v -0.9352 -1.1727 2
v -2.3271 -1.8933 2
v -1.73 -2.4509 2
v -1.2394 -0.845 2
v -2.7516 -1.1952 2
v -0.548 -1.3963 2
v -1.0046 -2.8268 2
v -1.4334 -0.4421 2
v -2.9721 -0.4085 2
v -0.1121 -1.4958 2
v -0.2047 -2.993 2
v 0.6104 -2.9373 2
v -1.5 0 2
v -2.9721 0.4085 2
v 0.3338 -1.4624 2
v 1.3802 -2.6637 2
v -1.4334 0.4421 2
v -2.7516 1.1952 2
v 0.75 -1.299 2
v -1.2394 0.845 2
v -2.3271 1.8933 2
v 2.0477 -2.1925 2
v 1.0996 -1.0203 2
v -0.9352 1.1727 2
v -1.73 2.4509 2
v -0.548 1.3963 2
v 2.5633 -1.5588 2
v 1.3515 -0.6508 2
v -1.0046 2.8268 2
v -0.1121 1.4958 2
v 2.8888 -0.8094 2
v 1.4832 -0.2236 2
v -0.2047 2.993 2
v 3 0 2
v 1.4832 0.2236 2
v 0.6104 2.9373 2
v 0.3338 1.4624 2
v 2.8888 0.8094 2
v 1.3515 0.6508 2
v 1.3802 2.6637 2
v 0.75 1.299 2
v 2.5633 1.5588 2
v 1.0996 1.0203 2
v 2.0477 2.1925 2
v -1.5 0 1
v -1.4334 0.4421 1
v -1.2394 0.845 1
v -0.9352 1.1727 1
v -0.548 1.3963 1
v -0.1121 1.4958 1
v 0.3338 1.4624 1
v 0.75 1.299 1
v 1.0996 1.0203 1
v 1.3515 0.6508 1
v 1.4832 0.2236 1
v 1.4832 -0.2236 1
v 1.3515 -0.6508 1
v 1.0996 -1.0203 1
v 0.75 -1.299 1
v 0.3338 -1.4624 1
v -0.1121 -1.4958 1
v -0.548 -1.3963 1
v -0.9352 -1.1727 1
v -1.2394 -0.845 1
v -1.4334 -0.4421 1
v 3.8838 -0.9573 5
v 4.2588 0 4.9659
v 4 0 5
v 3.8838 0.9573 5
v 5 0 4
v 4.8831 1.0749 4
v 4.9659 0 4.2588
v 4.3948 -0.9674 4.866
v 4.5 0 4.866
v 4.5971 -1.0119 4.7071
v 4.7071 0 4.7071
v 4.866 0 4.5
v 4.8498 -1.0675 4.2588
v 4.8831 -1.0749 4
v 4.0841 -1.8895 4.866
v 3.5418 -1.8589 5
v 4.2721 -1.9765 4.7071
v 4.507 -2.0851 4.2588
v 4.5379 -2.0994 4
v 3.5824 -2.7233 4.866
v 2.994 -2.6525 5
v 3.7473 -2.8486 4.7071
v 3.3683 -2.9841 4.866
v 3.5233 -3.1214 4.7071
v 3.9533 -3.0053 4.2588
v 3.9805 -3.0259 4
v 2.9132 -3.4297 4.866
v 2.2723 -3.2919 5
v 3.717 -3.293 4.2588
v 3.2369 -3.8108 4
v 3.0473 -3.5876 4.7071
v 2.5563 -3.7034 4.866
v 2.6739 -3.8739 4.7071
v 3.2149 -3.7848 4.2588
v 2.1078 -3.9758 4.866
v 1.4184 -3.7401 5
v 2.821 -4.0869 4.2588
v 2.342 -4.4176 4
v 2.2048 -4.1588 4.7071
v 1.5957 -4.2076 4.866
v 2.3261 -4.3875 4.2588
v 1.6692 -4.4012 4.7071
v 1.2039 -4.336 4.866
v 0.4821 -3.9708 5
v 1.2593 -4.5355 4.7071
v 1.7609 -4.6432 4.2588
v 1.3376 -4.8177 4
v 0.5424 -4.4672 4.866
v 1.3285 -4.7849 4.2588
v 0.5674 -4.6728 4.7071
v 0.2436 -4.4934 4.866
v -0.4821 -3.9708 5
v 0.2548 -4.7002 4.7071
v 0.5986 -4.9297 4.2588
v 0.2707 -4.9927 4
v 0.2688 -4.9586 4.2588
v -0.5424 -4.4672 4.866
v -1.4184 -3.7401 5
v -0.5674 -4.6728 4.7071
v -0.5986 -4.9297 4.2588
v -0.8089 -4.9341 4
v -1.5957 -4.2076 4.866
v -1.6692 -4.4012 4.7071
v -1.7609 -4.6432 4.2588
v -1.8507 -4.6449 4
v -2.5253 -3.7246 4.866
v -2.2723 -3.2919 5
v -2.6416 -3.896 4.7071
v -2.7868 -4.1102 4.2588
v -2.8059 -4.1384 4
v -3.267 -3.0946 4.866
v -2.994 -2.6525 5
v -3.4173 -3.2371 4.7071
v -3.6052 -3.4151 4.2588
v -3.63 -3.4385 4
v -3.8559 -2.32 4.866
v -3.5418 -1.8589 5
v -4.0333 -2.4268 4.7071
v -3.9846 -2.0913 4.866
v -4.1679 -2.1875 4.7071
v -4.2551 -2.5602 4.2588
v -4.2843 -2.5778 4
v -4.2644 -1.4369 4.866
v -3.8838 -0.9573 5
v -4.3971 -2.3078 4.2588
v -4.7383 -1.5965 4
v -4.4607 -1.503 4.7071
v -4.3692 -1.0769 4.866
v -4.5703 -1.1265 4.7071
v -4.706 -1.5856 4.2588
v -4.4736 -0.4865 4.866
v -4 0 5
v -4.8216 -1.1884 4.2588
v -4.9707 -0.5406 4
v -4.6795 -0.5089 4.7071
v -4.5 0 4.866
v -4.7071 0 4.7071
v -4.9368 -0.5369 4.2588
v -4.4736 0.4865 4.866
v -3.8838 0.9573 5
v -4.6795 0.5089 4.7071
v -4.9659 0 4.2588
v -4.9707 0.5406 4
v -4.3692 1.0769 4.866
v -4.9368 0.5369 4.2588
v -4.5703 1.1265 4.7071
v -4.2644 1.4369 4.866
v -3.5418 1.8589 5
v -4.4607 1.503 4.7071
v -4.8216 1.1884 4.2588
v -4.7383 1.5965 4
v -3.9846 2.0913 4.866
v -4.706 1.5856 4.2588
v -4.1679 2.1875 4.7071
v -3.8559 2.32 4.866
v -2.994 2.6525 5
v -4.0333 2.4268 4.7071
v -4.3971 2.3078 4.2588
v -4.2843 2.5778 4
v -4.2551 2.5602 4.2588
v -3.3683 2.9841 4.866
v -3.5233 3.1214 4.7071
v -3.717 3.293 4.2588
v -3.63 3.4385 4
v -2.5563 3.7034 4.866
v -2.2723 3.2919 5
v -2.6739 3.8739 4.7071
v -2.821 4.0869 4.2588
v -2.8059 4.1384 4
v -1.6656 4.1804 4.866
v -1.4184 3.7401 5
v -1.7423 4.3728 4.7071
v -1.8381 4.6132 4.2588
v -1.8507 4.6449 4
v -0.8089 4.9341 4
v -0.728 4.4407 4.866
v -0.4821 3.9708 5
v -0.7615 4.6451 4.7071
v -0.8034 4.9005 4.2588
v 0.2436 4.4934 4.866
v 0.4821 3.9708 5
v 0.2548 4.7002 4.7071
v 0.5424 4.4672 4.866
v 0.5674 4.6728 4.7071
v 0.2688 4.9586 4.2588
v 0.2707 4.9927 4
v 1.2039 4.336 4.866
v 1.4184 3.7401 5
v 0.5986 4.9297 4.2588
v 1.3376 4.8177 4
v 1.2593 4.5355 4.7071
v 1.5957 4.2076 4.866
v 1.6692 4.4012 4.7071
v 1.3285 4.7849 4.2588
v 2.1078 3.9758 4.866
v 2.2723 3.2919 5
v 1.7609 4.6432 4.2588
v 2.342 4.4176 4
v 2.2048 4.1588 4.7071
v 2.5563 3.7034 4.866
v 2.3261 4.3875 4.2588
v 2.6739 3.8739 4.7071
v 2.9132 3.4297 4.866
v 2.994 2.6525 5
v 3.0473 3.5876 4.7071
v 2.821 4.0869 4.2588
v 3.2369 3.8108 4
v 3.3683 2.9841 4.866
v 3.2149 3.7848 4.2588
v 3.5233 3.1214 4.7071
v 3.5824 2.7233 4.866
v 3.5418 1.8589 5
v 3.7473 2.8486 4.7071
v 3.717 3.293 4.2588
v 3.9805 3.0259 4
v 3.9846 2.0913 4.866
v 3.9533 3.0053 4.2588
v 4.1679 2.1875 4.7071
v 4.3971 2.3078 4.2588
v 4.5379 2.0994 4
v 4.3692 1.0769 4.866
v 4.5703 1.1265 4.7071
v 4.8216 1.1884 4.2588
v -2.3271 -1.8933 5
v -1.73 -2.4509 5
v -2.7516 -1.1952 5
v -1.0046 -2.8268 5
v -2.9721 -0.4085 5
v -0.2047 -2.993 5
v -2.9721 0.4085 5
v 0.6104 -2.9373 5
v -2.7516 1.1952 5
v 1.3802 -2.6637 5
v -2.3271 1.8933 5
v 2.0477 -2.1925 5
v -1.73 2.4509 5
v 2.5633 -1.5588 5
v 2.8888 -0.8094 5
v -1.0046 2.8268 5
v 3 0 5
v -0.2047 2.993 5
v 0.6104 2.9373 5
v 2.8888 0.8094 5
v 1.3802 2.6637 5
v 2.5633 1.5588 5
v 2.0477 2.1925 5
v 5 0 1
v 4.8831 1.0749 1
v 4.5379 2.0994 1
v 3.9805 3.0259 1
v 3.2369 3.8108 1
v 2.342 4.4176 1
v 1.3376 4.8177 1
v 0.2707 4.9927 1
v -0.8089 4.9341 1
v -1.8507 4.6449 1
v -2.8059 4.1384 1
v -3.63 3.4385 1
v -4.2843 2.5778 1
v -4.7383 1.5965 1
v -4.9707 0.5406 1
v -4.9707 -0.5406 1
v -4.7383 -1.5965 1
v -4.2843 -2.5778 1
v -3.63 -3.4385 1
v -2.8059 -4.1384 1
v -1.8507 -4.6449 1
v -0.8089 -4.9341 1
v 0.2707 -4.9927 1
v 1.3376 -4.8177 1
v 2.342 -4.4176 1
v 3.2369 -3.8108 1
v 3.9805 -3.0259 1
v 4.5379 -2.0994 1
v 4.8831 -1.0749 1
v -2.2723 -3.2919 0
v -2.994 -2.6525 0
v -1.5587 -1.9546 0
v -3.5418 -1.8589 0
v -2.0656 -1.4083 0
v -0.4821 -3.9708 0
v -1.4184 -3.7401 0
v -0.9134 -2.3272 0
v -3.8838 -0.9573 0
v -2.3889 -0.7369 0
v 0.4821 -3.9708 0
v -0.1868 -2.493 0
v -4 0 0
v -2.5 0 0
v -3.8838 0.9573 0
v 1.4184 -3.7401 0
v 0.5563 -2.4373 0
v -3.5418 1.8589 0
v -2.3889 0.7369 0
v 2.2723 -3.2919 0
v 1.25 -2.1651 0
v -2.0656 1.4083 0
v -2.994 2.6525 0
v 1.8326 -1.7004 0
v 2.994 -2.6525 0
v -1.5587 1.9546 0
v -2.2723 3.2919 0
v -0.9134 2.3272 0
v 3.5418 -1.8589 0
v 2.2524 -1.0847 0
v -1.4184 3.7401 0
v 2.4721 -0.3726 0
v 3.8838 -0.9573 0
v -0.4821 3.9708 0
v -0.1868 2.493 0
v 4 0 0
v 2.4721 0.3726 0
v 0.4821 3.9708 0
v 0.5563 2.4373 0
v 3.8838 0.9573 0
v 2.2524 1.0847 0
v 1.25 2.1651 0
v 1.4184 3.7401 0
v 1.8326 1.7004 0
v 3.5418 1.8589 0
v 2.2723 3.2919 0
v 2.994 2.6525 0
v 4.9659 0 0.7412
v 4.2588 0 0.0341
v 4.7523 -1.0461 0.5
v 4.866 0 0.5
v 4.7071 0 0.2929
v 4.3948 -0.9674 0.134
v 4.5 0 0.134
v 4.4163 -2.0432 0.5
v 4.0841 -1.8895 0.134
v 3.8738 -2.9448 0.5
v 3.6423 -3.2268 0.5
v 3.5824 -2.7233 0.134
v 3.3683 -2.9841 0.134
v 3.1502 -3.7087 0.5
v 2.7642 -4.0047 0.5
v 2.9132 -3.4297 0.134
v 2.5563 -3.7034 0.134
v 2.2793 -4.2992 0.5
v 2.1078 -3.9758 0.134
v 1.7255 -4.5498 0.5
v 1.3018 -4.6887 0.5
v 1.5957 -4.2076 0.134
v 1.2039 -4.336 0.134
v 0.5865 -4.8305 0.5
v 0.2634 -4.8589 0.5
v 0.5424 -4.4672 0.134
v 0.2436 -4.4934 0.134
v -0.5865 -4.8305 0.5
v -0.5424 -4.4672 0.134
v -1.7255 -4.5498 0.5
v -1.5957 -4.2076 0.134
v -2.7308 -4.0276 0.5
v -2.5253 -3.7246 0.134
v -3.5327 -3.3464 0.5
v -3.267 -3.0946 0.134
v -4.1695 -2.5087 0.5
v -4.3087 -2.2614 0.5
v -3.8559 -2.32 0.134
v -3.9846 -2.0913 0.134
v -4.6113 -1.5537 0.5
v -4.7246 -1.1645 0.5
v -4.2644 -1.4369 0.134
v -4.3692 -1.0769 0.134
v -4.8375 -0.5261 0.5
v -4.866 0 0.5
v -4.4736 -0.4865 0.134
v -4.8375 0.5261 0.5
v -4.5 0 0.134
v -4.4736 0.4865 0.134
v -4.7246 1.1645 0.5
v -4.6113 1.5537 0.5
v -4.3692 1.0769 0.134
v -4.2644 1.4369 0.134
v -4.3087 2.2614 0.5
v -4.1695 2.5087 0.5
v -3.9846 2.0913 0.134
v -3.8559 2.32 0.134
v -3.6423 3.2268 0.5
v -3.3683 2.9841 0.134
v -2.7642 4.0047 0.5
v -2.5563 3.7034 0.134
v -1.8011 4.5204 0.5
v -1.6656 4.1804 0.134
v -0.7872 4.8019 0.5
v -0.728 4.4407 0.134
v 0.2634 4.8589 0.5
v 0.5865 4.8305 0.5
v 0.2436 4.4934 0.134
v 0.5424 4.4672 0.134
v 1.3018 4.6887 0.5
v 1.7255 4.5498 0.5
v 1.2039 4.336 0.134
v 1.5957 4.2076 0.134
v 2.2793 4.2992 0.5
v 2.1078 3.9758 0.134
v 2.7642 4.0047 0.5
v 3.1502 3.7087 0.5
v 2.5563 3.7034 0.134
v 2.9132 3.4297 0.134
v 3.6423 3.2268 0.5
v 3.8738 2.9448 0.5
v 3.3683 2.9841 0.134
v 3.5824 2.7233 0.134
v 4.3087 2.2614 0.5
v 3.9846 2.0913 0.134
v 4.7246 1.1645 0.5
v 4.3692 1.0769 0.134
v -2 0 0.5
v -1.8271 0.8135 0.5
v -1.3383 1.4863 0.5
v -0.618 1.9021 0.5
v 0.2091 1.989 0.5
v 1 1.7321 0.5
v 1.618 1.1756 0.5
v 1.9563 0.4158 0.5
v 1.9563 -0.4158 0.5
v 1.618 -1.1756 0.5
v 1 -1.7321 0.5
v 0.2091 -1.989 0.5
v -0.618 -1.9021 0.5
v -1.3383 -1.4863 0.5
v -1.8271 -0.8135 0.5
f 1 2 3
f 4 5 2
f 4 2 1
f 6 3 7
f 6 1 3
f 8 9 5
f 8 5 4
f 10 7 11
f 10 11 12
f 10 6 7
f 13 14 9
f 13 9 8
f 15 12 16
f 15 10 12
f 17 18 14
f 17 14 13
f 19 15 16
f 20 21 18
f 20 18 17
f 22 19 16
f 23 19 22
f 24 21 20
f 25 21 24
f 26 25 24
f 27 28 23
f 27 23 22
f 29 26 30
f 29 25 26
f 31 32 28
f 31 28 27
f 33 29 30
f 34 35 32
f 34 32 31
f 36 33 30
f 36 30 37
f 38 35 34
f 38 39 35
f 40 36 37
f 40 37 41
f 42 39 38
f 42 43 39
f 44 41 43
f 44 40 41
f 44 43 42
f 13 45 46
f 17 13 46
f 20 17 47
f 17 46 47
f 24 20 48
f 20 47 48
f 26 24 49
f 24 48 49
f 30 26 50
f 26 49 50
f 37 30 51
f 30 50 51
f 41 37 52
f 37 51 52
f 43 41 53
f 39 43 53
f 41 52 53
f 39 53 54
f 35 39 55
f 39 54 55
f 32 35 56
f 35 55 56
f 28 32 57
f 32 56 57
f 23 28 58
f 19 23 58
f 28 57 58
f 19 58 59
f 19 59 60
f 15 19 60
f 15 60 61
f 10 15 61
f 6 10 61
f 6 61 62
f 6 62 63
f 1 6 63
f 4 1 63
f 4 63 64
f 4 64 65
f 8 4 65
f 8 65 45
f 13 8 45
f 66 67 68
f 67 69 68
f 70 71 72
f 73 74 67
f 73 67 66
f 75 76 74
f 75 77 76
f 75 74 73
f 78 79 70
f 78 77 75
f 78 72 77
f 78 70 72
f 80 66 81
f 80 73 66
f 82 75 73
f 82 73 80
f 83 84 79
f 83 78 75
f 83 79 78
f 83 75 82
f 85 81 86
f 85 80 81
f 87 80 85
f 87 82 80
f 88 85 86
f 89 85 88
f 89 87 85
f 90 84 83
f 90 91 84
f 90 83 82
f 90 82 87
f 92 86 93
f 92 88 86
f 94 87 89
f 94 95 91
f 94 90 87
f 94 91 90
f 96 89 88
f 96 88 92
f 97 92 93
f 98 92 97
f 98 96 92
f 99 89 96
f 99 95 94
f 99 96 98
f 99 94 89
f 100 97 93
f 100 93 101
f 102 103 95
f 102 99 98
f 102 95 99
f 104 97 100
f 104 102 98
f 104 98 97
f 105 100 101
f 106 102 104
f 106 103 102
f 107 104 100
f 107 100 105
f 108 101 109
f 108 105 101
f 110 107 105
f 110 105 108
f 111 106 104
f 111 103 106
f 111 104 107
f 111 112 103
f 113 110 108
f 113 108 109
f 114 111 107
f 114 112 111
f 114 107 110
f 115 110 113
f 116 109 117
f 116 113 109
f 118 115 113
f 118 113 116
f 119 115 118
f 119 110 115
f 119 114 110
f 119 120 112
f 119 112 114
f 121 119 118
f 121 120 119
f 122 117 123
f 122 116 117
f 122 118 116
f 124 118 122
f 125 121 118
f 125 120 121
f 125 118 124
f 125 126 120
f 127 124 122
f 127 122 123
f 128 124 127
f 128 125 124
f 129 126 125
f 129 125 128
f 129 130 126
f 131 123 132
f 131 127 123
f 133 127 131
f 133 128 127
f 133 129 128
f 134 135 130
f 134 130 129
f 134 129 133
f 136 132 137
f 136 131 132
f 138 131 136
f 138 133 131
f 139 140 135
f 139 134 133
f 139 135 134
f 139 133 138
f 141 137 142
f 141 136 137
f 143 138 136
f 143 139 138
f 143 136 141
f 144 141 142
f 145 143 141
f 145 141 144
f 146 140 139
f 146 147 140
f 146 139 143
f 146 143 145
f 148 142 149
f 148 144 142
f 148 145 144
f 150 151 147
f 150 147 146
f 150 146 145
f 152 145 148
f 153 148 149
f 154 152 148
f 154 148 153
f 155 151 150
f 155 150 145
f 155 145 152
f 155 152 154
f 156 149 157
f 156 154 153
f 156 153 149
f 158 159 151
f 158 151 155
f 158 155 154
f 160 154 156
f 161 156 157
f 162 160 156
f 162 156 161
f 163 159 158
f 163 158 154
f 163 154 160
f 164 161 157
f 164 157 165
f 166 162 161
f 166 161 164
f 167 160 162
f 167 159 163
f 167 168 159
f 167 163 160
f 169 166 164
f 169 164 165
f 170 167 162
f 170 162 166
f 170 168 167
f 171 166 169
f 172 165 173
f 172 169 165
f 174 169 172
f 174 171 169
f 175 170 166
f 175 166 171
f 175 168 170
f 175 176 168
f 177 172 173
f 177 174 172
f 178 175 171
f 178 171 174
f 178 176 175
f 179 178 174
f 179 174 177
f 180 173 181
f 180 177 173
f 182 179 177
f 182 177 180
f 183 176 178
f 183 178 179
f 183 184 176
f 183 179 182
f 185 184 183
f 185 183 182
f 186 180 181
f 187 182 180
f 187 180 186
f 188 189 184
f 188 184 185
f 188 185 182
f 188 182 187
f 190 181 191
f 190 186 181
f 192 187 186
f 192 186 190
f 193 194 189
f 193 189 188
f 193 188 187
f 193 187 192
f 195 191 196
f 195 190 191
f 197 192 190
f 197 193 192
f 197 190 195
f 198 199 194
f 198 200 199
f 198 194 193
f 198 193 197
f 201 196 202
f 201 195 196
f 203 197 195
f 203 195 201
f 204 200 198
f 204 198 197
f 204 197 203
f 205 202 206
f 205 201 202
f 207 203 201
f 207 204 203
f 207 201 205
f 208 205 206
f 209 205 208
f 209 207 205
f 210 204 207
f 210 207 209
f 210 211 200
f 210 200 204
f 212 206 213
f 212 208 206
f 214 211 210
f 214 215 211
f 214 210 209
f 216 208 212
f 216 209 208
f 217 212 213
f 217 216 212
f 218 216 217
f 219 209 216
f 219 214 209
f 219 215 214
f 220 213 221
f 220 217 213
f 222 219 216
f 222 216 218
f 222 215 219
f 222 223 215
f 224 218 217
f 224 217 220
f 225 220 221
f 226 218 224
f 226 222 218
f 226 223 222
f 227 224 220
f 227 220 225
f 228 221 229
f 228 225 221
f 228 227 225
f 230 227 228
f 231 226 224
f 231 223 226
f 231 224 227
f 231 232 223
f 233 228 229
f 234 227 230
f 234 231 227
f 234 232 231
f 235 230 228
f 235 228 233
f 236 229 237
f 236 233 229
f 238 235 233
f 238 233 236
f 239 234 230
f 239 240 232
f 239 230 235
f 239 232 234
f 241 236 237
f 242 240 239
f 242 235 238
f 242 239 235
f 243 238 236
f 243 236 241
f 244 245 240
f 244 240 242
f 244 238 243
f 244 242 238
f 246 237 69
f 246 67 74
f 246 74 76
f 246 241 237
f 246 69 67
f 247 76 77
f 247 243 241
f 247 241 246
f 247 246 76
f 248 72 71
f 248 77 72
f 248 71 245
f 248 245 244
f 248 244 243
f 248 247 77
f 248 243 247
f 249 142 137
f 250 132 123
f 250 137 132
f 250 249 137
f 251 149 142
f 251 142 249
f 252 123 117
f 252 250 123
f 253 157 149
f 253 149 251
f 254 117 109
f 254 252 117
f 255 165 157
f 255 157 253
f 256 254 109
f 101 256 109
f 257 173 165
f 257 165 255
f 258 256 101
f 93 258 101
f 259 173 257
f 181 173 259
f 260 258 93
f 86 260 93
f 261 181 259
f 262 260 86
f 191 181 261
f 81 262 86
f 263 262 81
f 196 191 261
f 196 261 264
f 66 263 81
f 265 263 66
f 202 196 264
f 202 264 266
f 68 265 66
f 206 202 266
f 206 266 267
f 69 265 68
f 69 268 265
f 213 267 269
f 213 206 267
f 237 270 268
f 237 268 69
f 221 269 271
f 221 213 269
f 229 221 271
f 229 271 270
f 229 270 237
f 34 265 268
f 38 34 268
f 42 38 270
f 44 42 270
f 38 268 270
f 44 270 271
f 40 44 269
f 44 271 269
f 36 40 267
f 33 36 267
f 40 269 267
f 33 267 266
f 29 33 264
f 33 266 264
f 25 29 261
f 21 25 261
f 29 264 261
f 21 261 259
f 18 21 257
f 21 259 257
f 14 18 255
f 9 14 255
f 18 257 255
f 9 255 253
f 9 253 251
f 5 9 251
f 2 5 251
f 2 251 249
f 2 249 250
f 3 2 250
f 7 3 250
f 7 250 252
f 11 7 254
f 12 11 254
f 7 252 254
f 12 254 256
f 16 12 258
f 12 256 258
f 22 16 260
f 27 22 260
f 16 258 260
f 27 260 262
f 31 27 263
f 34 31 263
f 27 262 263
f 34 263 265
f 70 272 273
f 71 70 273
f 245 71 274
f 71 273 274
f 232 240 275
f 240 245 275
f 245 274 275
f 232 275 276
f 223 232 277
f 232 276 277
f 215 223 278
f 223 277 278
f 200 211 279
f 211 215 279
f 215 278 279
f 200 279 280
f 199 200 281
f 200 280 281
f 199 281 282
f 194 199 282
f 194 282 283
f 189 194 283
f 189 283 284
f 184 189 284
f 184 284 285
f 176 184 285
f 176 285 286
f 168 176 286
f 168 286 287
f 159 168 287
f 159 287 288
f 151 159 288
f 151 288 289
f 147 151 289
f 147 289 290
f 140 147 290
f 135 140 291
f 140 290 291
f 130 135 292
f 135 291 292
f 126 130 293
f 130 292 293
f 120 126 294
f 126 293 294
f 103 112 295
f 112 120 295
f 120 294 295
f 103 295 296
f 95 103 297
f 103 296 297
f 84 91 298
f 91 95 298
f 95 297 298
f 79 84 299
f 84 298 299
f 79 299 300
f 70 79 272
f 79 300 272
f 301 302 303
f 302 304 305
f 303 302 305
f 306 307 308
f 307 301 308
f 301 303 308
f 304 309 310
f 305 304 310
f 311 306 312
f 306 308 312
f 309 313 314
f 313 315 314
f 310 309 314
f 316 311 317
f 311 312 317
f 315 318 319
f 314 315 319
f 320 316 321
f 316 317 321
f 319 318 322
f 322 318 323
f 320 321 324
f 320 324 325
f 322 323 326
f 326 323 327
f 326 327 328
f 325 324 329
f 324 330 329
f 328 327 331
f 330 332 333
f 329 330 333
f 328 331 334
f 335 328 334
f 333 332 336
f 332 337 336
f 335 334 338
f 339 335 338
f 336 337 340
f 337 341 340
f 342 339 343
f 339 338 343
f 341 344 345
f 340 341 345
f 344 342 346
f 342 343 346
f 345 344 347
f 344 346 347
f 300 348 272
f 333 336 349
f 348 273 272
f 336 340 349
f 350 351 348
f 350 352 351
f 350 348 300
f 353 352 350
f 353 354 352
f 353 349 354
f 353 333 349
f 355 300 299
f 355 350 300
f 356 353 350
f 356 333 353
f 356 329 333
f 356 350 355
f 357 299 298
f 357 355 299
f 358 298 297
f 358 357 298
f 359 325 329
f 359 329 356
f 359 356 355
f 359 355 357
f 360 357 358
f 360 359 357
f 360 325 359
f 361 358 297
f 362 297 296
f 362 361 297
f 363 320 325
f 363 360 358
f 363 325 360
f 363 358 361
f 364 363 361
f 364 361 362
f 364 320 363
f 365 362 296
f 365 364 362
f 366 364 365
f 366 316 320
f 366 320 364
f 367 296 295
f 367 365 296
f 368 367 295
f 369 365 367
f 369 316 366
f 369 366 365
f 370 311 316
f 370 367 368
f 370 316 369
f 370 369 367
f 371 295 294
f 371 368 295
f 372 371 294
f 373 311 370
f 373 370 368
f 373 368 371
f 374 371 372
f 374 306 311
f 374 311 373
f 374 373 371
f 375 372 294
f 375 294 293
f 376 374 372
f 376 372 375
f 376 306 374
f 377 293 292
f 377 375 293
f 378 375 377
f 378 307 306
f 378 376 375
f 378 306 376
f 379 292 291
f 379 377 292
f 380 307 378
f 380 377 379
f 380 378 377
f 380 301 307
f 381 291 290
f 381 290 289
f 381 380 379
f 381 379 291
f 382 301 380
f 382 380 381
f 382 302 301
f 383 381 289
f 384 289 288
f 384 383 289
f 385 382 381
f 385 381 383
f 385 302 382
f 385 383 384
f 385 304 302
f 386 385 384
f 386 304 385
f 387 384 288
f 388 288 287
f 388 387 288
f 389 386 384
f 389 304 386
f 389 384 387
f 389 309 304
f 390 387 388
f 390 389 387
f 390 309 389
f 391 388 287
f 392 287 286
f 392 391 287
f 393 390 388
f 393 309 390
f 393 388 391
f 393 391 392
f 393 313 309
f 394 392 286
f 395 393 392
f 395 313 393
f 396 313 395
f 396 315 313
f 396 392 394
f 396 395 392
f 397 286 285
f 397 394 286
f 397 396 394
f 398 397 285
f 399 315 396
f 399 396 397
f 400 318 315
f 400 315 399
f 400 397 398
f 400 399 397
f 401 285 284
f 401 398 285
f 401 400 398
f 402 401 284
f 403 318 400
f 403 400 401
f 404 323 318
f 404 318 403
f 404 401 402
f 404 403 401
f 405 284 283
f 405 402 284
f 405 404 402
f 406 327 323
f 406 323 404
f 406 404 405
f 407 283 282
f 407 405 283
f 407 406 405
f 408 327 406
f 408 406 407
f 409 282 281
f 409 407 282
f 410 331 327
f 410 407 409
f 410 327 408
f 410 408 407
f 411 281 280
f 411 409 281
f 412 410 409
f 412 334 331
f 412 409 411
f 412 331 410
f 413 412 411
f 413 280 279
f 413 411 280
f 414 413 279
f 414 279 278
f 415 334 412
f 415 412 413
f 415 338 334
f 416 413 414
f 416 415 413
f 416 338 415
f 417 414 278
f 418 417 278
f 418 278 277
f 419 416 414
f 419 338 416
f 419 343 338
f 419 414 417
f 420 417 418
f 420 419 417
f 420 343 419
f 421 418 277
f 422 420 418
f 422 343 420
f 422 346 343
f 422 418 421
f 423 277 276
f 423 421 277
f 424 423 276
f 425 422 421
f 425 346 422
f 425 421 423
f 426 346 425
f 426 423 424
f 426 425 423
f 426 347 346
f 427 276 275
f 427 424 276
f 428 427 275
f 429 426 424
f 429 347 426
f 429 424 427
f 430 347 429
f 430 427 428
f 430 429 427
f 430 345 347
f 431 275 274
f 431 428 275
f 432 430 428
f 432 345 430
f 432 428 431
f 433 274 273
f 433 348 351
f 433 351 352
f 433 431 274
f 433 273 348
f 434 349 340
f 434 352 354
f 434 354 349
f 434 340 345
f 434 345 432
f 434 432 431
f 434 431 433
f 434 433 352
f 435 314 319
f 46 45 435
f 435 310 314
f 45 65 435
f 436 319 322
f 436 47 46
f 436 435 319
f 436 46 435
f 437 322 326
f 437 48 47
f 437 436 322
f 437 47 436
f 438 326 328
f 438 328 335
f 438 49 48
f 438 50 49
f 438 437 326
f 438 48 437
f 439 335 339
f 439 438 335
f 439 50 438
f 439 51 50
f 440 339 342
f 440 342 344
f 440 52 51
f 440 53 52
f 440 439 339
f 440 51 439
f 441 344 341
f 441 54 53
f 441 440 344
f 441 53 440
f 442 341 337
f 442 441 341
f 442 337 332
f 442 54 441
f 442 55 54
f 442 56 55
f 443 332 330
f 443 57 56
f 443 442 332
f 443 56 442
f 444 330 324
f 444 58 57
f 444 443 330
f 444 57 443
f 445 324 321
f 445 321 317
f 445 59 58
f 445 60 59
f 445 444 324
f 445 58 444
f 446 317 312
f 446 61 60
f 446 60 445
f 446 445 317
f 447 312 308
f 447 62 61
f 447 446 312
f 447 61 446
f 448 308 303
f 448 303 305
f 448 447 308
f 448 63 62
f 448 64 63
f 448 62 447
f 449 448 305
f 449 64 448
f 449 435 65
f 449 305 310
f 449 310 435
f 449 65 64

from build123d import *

# Parameters (mm, degrees)
ESQUISSE1_R             = 5
BOSS_EXTRU_1_DEPTH      = 5
ESQUISSE2_R             = 3
ENL_V_MAT_EXTRU_1_DEPTH = 3
ESQUISSE9_R             = 1.5
ENL_V_MAT_EXTRU_2_DEPTH = 3
CHANFREIN1_SIZE         = 1


with BuildPart() as part:
    # Esquisse1 → Boss.-Extru.1 (new body)
    with BuildSketch(Plane.XY):
        Circle(ESQUISSE1_R)
    extrude(amount=BOSS_EXTRU_1_DEPTH)

    # Esquisse2 → Enlèv. mat.-Extru.1 (cut)
    with BuildSketch(Plane.XY.offset(5)):
        Circle(ESQUISSE2_R)
    extrude(amount=-ENL_V_MAT_EXTRU_1_DEPTH, mode=Mode.SUBTRACT)

    # Esquisse3 → Enlèvement de matière-Révolution1 (revolve, cut)
    with BuildSketch(Plane(origin=(0, 0, 0), x_dir=(0, 0, -1), z_dir=(1, 0, 0)), mode=Mode.PRIVATE) as enl_vement_de_mati_re_r_volution1_sk:
        with BuildLine():
            Line((0, 5), (-1, 5))
            ThreePointArc((-1, 5), (-0.292893219, 4.707106781), (0, 4))
            Line((0, 4), (0, 5))
        make_face()
        with BuildLine():
            Line((-4, 5), (-5, 5))
            Line((-5, 5), (-5, 4))
            ThreePointArc((-5, 4), (-4.707106781, 4.707106781), (-4, 5))
        make_face()
    revolve(enl_vement_de_mati_re_r_volution1_sk.sketch.rotate(Axis((0, 0, 5), (0, 0, -1)), 90), axis=Axis((0, 0, 5), (0, 0, -1)), mode=Mode.SUBTRACT)

    # Esquisse9 → Enlèv. mat.-Extru.2 (cut)
    with BuildSketch(Plane(origin=(0, 0, 0), x_dir=(-1, 0, 0), z_dir=(0, 0, -1))):
        Circle(ESQUISSE9_R)
    extrude(amount=-ENL_V_MAT_EXTRU_2_DEPTH, mode=Mode.SUBTRACT)

    # Chanfrein1
    chanfrein1_edges = [part.edges().sort_by_distance(p)[0] for p in [
        (1.5, 0, 0),
    ]]
    chamfer(chanfrein1_edges, length=CHANFREIN1_SIZE)


solid = part.part
